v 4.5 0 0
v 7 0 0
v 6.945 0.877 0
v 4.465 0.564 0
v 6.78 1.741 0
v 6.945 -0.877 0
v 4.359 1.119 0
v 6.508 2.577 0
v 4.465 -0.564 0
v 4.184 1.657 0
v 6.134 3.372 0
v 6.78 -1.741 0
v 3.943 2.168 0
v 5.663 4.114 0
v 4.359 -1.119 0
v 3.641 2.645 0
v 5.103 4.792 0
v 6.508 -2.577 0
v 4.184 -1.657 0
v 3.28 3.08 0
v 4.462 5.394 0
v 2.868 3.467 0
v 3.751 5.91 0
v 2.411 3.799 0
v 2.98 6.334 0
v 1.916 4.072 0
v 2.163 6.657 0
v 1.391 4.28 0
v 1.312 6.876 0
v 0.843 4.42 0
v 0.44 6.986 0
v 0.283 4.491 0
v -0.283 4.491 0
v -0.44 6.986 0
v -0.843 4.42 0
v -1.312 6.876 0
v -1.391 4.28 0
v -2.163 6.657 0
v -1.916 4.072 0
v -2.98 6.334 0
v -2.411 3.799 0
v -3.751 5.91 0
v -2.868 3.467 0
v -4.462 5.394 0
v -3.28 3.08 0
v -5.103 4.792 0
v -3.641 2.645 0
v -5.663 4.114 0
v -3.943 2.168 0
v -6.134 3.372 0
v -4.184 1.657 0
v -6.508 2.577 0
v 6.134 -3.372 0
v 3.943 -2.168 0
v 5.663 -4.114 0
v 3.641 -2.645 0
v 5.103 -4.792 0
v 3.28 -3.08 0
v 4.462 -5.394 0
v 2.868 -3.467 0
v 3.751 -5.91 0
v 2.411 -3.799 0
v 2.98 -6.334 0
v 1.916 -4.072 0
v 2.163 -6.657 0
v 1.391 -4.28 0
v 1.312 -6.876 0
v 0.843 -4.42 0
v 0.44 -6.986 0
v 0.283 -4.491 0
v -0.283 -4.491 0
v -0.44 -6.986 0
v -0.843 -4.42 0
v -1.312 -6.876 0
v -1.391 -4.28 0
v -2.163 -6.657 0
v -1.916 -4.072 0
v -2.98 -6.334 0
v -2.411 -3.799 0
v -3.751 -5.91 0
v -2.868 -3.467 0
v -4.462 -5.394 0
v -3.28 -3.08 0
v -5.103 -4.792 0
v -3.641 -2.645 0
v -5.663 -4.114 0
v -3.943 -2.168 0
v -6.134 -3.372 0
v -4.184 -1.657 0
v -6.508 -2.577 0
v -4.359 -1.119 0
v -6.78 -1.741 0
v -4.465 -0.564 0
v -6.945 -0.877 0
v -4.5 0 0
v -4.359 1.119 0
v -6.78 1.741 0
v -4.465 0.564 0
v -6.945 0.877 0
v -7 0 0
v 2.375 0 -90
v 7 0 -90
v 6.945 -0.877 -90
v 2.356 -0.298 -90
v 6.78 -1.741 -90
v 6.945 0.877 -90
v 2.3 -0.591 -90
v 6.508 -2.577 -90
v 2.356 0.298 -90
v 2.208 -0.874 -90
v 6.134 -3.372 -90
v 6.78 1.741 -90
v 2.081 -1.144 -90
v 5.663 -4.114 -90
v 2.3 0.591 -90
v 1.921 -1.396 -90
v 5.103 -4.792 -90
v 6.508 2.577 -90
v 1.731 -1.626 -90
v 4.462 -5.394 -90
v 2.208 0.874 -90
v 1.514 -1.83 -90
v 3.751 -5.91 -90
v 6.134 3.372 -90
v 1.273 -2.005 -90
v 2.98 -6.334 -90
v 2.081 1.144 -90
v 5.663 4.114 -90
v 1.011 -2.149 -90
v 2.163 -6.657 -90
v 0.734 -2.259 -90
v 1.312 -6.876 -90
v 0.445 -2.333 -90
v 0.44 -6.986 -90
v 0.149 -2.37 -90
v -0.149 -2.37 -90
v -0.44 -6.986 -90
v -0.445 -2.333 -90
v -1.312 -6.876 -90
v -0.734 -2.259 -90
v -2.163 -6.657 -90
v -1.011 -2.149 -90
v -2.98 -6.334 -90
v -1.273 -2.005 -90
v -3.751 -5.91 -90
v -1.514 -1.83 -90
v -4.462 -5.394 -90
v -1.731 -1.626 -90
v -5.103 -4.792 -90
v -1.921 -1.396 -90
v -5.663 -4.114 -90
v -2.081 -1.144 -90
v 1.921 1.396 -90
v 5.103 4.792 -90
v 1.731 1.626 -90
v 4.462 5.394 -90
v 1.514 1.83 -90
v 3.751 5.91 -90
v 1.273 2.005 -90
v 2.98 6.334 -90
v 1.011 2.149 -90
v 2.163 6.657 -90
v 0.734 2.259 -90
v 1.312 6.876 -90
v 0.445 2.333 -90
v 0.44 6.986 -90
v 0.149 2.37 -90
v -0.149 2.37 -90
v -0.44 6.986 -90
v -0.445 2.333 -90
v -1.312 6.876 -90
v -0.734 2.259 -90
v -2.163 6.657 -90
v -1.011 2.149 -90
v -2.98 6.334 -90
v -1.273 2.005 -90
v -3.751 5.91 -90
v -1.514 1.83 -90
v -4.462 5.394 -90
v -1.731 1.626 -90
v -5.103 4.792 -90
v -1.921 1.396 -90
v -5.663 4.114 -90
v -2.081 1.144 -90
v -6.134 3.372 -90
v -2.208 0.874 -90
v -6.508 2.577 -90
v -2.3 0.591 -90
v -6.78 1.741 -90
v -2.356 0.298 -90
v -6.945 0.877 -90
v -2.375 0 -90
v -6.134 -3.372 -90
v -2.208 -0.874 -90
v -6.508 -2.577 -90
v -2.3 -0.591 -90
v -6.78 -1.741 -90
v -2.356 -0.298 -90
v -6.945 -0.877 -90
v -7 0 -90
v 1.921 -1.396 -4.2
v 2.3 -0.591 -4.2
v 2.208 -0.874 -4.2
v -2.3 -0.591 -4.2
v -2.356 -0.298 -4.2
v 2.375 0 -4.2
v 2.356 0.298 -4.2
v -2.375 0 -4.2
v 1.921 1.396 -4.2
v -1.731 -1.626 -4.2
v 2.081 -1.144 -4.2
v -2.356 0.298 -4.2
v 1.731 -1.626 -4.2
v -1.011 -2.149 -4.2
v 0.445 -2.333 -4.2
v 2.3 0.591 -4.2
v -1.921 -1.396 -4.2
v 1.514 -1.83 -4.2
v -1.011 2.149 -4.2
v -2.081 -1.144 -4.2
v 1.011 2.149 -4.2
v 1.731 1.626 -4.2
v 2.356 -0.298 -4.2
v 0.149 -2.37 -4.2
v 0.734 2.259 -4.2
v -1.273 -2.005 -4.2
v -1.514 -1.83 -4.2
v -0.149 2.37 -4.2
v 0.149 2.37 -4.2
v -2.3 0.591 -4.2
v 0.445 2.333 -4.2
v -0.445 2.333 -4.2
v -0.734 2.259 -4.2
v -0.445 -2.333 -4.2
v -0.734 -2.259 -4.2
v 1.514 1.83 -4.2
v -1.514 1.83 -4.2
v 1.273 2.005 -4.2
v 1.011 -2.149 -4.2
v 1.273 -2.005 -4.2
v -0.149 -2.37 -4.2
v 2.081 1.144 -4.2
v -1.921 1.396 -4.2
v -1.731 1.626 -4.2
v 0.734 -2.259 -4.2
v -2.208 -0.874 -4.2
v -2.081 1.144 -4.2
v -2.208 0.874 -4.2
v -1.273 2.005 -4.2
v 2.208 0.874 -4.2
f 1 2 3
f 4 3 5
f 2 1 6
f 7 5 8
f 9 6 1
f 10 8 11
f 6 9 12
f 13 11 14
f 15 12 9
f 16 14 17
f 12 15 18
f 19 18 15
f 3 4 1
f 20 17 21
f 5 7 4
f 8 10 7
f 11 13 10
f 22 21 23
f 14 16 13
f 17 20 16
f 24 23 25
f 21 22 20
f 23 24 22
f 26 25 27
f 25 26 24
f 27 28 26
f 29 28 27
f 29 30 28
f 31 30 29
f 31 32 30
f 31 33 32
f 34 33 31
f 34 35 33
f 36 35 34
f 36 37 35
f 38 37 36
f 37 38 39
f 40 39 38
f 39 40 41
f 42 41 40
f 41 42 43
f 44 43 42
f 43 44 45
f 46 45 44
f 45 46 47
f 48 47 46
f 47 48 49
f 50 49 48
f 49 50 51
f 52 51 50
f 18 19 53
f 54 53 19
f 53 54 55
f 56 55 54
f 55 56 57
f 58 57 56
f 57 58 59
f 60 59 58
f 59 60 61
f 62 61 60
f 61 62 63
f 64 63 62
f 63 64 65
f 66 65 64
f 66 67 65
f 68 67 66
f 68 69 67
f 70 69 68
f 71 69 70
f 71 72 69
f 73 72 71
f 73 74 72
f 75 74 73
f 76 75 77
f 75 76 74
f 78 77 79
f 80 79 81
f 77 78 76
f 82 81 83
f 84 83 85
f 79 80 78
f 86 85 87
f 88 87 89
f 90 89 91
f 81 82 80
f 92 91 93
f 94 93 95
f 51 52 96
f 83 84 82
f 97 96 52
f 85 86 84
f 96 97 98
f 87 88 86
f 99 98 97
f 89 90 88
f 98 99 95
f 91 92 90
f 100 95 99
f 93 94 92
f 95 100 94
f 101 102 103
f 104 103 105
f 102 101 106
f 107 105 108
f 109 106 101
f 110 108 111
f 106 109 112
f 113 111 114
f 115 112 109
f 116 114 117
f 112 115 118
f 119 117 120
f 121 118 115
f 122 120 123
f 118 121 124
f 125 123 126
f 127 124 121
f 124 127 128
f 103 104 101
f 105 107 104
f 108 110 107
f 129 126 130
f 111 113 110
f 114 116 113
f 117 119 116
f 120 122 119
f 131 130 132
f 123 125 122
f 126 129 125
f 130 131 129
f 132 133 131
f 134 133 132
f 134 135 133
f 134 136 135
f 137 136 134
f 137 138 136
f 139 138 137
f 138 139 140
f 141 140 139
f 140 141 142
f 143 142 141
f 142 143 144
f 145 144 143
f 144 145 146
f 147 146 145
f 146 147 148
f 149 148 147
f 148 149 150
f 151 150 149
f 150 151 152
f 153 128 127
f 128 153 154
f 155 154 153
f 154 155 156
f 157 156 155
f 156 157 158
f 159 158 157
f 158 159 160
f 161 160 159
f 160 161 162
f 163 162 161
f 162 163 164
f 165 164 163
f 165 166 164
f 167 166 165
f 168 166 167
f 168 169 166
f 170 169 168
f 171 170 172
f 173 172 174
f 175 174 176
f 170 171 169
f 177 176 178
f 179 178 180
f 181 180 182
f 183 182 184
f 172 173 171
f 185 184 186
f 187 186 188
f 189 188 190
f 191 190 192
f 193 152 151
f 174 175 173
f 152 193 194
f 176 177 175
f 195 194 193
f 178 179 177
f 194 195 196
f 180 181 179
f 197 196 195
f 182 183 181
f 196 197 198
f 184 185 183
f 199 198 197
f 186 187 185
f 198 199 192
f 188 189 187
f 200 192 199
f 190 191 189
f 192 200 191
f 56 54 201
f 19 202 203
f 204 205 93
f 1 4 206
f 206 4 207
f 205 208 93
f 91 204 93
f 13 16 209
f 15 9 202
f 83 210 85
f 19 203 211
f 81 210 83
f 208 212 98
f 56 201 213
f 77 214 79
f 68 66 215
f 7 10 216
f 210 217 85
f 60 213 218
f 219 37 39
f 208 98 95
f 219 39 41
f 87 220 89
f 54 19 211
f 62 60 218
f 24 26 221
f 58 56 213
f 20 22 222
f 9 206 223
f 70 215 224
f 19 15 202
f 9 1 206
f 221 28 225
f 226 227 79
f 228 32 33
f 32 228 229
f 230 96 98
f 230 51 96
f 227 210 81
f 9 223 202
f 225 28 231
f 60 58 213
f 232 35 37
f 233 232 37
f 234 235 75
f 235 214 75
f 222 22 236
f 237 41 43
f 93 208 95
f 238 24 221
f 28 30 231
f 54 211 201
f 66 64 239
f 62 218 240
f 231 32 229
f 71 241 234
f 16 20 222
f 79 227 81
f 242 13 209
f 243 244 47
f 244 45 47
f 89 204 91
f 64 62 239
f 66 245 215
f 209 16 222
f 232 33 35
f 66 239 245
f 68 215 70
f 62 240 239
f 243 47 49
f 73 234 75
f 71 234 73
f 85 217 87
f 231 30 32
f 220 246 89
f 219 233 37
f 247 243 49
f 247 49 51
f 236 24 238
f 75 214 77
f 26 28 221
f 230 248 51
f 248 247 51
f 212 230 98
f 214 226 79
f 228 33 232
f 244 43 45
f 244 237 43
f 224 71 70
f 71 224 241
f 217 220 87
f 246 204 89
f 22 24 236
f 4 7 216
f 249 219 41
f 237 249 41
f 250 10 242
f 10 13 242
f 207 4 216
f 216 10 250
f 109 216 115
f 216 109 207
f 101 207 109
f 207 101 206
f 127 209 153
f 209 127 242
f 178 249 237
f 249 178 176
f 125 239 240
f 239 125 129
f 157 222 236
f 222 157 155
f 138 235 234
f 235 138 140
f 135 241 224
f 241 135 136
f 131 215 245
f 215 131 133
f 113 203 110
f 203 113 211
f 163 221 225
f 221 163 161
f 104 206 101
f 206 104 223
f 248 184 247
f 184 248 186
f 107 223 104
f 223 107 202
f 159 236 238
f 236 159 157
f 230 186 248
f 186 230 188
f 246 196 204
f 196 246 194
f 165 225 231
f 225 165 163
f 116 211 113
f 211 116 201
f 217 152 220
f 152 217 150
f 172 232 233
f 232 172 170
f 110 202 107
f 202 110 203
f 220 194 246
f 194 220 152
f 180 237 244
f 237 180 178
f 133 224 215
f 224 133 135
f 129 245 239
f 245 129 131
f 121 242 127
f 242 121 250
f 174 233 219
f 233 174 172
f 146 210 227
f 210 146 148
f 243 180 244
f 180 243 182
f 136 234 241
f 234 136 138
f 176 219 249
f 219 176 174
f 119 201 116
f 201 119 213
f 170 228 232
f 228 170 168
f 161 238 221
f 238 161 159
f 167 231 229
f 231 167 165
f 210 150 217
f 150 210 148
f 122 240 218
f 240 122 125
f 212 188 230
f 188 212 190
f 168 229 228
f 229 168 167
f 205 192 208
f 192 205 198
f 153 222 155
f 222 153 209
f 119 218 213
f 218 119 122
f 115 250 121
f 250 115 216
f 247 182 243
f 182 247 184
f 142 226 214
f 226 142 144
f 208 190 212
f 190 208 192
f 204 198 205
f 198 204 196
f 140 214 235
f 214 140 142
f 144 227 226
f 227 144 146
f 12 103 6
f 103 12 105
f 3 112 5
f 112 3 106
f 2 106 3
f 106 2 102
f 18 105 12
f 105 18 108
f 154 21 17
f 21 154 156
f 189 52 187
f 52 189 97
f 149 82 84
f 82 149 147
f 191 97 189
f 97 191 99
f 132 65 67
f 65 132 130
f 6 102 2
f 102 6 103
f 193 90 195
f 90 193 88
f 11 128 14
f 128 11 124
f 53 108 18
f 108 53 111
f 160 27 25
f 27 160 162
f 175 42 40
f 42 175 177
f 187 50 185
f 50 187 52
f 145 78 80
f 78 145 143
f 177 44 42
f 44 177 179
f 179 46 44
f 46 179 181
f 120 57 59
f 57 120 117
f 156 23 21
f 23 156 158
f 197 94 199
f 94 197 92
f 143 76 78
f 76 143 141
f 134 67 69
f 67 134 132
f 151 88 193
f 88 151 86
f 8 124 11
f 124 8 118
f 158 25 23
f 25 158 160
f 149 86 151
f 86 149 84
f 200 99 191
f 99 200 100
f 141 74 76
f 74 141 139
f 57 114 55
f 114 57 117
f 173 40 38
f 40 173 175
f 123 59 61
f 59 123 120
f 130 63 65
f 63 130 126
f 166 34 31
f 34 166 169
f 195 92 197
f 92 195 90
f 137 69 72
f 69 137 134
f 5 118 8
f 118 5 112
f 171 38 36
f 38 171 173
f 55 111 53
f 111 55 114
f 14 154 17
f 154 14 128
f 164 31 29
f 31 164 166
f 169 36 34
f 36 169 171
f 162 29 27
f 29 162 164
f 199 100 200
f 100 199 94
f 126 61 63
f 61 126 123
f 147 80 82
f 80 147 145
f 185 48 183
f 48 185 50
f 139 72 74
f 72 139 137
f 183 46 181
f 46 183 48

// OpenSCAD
$fn = 50;


difference() {
	union() {
		translate(v = [0, 0, -90.0000000000]) {
			cylinder(h = 90, r = 7.0000000000);
		}
		cylinder(h = 0, r = 17.0000000000);
	}
	union() {
		translate(v = [0, 0, 0]) {
			rotate(a = [0, 0, 0]) {
				difference() {
					union() {
						#translate(v = [0, 0, -90.0000000000]) {
							cylinder(h = 90, r = 2.2500000000);
						}
						#translate(v = [0, 0, -4.2000000000]) {
							cylinder(h = 4.2000000000, r = 7.0000000000, r1 = 2.3750000000, r2 = 4.5000000000);
						}
						#translate(v = [0, 0, -90.0000000000]) {
							cylinder(h = 90, r = 2.3750000000);
						}
						#translate(v = [0, 0, -90.0000000000]) {
							cylinder(h = 90, r = 2.2500000000);
						}
					}
					union();
				}
			}
		}
	}
}
